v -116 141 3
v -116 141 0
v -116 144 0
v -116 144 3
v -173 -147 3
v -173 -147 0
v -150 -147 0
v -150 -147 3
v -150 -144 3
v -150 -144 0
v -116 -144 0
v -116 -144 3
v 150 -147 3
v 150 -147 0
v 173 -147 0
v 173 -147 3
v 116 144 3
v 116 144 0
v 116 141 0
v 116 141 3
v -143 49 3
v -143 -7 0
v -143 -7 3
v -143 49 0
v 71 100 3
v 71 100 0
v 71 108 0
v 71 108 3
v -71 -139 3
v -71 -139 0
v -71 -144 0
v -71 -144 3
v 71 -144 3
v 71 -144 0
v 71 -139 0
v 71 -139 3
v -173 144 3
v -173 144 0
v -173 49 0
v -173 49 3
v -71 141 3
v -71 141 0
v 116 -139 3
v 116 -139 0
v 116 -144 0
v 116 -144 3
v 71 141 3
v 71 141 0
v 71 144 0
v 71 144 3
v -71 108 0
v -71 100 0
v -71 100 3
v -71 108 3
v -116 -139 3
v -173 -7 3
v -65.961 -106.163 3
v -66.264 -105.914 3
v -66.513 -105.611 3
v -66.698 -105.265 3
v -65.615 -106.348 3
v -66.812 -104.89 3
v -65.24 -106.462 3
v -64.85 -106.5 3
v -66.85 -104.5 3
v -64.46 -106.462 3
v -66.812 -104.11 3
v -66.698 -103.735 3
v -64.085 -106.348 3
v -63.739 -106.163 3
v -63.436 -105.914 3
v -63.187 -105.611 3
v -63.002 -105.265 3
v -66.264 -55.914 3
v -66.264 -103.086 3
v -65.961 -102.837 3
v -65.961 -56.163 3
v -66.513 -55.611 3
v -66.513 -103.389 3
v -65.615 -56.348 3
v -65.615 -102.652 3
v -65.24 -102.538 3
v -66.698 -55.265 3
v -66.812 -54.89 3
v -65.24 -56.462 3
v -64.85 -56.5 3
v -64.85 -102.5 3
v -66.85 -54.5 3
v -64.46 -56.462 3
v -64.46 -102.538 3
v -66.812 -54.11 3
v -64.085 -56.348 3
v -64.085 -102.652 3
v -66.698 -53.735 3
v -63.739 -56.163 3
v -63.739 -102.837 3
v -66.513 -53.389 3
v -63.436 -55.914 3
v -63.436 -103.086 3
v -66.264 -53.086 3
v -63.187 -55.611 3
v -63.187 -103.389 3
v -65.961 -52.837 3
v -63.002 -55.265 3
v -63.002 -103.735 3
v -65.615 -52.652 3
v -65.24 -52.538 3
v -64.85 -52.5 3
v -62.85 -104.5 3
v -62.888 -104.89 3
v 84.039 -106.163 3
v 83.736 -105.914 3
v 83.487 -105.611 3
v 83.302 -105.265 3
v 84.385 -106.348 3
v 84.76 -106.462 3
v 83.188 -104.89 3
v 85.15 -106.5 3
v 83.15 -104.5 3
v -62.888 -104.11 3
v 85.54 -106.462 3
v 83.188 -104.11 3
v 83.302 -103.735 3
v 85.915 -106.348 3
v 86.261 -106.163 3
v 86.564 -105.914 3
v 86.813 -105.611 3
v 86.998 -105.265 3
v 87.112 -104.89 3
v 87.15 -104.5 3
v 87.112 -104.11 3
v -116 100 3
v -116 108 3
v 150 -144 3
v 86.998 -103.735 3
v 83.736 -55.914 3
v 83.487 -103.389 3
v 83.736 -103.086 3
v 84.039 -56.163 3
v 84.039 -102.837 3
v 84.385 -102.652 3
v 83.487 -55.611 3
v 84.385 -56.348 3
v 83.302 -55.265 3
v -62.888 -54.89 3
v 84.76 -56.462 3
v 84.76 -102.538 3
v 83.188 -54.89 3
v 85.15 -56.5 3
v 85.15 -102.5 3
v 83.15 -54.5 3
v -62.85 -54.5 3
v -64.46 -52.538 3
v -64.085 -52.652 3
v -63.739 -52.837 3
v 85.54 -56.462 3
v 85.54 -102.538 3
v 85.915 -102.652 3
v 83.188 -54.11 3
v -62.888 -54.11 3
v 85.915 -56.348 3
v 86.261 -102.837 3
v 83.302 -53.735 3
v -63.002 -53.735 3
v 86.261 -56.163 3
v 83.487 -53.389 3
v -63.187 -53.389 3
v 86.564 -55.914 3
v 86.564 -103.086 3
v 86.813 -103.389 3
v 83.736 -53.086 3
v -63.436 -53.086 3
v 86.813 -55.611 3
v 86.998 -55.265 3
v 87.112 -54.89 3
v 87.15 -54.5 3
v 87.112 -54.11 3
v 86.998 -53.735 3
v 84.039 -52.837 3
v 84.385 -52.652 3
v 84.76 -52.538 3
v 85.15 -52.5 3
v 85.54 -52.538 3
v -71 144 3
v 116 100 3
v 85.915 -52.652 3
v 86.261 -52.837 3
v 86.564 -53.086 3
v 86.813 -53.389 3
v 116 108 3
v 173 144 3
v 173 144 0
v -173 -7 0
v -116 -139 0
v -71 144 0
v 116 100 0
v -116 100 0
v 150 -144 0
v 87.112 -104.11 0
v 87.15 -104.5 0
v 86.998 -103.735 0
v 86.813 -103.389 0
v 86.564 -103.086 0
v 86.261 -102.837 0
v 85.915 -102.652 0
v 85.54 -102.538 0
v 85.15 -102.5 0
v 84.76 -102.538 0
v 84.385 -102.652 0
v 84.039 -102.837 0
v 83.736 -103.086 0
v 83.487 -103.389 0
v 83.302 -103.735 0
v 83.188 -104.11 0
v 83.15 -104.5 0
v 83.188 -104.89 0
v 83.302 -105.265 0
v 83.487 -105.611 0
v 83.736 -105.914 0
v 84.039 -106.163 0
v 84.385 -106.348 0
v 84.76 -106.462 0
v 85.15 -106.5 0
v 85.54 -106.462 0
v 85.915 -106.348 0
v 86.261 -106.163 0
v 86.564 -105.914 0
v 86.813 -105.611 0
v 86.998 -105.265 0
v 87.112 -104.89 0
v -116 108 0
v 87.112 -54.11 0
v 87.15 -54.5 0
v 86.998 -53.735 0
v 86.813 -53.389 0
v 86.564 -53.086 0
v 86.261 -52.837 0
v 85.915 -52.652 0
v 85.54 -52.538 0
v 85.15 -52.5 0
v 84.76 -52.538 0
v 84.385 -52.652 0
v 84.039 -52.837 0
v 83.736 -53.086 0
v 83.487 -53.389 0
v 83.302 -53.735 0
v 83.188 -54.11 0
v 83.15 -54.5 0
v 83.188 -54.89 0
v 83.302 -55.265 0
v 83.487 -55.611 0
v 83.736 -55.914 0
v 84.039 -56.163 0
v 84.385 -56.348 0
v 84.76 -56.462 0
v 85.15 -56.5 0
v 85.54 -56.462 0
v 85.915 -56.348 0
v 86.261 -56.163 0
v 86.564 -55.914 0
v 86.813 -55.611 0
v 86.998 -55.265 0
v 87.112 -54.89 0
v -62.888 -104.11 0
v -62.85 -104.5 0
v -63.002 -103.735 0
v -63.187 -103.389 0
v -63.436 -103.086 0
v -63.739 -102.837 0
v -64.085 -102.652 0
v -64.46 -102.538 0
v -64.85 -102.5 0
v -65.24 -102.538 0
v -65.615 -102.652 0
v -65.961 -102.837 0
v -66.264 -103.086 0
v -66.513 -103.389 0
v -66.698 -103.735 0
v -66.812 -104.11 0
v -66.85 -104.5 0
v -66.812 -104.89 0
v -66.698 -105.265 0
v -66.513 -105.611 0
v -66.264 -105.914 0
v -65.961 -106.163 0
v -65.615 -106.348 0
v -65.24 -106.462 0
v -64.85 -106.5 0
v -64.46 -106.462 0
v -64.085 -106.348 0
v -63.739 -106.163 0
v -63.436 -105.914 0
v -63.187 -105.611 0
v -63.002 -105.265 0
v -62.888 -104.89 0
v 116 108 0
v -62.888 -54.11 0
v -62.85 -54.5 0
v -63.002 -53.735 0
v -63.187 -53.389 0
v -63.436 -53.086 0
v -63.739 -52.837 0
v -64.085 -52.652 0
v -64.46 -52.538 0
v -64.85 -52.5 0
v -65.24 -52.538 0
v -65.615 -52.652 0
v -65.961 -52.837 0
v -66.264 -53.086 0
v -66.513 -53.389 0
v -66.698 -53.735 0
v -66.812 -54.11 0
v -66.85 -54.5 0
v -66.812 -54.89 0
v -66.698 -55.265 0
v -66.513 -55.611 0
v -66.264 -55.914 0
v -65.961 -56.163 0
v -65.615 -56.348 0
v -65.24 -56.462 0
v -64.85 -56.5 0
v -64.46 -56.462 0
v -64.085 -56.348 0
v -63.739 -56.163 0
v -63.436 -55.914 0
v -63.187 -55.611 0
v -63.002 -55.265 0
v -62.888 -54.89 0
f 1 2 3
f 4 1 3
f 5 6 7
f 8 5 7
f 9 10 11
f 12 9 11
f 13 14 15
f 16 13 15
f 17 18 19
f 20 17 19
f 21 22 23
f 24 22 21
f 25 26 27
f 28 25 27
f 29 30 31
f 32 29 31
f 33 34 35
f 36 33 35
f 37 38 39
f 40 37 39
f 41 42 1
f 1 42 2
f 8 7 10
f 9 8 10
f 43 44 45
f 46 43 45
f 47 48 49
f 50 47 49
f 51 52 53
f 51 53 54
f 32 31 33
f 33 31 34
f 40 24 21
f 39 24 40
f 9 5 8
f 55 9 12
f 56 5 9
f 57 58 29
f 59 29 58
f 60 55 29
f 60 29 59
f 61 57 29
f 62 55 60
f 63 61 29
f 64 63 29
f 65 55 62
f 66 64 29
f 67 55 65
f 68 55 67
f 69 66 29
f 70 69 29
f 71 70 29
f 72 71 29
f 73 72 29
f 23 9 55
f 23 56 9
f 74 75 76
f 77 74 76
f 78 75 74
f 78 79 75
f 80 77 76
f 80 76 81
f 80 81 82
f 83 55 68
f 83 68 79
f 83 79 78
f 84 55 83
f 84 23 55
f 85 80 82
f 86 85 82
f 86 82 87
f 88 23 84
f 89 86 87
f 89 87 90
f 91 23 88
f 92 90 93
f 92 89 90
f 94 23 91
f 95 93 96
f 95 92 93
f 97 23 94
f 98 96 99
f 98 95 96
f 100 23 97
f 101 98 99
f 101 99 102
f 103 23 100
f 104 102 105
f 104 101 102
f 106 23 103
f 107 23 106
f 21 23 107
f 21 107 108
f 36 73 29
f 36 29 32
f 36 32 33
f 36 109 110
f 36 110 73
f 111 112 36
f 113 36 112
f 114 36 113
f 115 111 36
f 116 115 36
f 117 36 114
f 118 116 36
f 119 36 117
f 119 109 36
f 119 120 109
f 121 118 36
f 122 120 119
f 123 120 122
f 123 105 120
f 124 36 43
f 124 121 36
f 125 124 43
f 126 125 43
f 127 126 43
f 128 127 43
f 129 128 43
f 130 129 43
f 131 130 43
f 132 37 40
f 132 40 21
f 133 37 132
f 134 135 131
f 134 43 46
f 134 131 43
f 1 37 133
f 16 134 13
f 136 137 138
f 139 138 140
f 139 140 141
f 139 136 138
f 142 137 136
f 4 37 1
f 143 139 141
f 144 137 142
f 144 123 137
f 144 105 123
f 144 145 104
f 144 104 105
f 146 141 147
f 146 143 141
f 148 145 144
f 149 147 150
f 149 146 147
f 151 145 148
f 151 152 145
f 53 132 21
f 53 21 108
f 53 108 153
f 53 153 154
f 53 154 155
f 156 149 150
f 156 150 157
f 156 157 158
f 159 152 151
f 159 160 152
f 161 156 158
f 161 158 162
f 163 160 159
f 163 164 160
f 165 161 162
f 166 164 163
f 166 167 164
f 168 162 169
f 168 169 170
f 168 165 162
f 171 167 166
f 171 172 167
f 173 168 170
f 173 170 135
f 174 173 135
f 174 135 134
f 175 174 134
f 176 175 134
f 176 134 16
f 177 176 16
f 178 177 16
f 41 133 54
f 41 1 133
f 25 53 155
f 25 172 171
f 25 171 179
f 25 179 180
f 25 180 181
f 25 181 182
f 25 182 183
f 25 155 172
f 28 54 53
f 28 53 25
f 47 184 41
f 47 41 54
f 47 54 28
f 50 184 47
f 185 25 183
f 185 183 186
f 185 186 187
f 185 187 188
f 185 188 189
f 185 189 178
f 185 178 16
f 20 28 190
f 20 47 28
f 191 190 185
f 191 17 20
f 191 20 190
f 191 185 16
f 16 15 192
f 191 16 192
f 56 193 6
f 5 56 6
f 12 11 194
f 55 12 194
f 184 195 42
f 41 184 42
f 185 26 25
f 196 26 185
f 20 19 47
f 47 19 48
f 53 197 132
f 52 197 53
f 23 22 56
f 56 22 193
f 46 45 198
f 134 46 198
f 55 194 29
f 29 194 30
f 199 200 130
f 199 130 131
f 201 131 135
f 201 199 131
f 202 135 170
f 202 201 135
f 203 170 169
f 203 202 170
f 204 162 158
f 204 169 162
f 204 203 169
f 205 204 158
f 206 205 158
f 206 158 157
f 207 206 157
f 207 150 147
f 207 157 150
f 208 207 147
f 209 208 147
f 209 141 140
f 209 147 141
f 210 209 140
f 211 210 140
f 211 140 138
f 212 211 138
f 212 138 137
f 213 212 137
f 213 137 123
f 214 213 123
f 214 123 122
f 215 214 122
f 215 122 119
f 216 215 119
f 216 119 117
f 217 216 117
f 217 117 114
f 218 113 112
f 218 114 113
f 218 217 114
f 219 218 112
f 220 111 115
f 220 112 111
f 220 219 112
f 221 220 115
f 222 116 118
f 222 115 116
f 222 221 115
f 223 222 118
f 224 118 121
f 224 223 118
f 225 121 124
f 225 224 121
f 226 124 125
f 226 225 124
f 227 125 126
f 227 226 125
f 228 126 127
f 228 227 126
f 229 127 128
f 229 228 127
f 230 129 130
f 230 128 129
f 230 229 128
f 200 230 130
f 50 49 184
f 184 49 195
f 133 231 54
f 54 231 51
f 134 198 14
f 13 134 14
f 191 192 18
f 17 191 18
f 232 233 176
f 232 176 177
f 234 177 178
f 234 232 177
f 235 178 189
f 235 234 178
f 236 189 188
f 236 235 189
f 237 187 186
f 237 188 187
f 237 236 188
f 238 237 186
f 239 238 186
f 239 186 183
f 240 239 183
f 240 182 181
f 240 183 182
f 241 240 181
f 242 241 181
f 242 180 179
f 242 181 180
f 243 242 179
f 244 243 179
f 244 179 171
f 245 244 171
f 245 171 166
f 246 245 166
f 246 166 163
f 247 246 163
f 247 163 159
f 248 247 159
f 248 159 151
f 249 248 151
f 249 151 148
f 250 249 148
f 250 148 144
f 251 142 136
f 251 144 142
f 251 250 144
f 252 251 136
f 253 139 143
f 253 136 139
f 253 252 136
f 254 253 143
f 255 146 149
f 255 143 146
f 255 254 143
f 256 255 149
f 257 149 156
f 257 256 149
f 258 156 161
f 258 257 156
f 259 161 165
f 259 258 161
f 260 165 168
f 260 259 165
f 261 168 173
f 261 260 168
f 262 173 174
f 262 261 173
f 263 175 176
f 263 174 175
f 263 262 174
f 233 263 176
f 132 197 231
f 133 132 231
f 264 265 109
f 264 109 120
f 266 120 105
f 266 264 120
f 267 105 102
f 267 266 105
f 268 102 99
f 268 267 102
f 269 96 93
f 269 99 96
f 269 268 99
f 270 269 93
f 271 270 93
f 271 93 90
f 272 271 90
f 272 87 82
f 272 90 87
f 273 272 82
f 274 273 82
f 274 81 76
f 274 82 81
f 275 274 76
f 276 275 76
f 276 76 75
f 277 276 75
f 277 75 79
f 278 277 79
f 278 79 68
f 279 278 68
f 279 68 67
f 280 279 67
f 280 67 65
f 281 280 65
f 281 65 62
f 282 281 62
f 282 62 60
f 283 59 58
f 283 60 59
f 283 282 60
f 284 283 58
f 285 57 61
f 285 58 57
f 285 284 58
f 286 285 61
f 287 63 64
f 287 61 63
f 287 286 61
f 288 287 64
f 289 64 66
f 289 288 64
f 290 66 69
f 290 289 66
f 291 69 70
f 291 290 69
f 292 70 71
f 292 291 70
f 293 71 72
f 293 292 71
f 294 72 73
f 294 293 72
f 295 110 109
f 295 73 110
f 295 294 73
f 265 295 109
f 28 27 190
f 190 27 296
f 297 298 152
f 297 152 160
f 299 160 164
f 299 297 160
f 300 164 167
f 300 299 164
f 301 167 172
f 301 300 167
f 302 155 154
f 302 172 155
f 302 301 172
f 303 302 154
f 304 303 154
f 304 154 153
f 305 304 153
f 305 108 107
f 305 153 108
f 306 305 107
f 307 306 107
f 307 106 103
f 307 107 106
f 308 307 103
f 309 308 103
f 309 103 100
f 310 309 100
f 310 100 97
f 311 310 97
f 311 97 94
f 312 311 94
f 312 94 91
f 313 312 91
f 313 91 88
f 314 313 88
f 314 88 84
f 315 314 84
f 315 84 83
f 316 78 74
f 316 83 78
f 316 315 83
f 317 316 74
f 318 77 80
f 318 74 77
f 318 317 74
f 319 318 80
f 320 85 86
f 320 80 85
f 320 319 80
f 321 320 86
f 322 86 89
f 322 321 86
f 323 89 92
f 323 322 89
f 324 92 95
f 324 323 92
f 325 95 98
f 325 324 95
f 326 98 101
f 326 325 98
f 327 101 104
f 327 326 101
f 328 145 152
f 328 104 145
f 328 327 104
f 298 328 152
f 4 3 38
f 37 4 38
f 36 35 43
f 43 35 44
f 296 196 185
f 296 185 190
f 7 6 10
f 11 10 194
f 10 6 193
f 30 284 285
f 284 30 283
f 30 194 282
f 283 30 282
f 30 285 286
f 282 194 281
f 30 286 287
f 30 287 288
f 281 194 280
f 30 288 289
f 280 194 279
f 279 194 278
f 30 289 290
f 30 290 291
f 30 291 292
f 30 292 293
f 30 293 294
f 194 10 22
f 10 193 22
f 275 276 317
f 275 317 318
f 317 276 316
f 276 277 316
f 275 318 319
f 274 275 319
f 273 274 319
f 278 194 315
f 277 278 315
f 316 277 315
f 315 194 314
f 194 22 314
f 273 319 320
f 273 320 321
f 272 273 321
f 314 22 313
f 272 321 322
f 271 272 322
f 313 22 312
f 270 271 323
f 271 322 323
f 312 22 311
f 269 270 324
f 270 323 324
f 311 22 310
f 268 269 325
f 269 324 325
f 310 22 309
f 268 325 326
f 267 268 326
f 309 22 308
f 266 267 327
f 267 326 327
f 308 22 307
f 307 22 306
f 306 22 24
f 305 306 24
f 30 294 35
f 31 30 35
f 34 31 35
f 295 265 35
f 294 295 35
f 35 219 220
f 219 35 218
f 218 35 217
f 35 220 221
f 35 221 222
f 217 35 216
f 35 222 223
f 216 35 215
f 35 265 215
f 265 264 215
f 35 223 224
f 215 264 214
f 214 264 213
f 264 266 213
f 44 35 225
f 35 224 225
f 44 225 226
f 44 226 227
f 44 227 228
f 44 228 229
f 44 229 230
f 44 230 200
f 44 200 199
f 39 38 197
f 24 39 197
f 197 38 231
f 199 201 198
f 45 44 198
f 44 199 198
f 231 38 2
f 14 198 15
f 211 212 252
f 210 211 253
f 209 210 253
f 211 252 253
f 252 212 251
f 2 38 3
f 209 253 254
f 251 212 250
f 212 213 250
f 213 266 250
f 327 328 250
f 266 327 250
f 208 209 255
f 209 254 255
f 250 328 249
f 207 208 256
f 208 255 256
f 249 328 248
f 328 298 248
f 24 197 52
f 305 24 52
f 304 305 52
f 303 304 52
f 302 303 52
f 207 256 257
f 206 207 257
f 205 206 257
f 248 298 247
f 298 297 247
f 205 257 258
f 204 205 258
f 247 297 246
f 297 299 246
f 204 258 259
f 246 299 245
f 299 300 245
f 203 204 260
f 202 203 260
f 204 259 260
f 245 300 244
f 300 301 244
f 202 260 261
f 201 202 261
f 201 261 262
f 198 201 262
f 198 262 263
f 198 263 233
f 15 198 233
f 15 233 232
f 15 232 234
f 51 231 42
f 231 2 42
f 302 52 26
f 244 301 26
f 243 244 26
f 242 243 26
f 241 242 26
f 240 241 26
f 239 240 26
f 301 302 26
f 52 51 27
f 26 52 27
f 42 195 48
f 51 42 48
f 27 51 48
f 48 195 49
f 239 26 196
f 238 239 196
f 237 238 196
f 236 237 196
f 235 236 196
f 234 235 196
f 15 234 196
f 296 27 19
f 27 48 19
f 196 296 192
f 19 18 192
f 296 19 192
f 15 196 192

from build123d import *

# Parameters (mm, degrees)
SCHIZZO1_W                    = 45
SCHIZZO1_H                    = 8
ESTRUSIONE_ESTRUSIONE1_DEPTH  = 3
TAGLIO_ESTRUSIONE1_DEPTH      = 228.039644115
TAGLIO_ESTRUSIONE1_DEPTH_BACK = 228.039644115
SCHIZZO2_R                    = 2
SCHIZZO3_W                    = 30
SCHIZZO3_H                    = 56
TAGLIO_ESTRUSIONE2_DEPTH      = 228.039644115


with BuildPart() as part:
    # Schizzo1 → Estrusione-Estrusione1 (new body)
    with BuildSketch(Plane.XY):
        Polygon((173, -147), (173, 144), (116, 144), (116, 141), (71, 141), (71, 144), (-71, 144), (-71, 141), (-116, 141), (-116, 144), (-173, 144), (-173, -147), (-150, -147), (-150, -144), (-116, -144), (-116, -139), (-71, -139), (-71, -144), (71, -144), (71, -139), (116, -139), (116, -144), (150, -144), (150, -147), align=None)
        with Locations((93.5, 104)):
            Rectangle(SCHIZZO1_W, SCHIZZO1_H, mode=Mode.SUBTRACT)
        with Locations((-93.5, 104)):
            Rectangle(SCHIZZO1_W, SCHIZZO1_H, mode=Mode.SUBTRACT)
    extrude(amount=ESTRUSIONE_ESTRUSIONE1_DEPTH)

    # Schizzo2 → Taglio-Estrusione1 (cut, two sides: drawn at the far end of the back side and taken through both)
    with BuildSketch(Plane.XY.offset(3).offset(-TAGLIO_ESTRUSIONE1_DEPTH_BACK)):
        with Locations((-64.85, -54.5)):
            Circle(SCHIZZO2_R)
        with Locations((85.15, -54.5)):
            Circle(SCHIZZO2_R)
        with Locations((85.15, -104.5)):
            Circle(SCHIZZO2_R)
        with Locations((-64.85, -104.5)):
            Circle(SCHIZZO2_R)
    extrude(amount=TAGLIO_ESTRUSIONE1_DEPTH + TAGLIO_ESTRUSIONE1_DEPTH_BACK, mode=Mode.SUBTRACT)

    # Schizzo3 → Taglio-Estrusione2 (cut, through all)
    with BuildSketch(Plane(origin=(0, 0, 0), x_dir=(-1, 0, 0), z_dir=(0, 0, -1))):
        with Locations((158, 21)):
            Rectangle(SCHIZZO3_W, SCHIZZO3_H)
    extrude(amount=-TAGLIO_ESTRUSIONE2_DEPTH, mode=Mode.SUBTRACT)


solid = part.part
